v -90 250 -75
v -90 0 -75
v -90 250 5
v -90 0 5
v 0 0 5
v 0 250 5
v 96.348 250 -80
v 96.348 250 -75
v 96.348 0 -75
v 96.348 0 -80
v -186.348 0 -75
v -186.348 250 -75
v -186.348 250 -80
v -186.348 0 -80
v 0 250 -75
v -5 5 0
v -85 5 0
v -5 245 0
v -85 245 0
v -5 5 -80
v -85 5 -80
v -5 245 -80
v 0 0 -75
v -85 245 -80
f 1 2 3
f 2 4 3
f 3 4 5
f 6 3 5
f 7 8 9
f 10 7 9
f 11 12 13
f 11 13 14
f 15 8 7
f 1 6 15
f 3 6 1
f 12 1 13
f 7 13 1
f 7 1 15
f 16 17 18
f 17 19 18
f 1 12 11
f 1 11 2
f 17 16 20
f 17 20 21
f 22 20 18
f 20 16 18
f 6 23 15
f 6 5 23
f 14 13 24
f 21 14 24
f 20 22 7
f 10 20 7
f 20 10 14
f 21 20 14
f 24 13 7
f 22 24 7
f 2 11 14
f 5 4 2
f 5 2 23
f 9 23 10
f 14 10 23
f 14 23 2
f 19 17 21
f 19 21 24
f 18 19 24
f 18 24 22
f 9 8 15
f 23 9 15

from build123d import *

# Parameters (mm, degrees)
ESQUISSE1_W        = 90
ESQUISSE1_H        = 250
BOSS_EXTRU_1_DEPTH = 5
ESQUISSE2_W        = 90
ESQUISSE2_H        = 250
ESQUISSE2_W_2      = 80
ESQUISSE2_H_2      = 240
BOSS_EXTRU_2_DEPTH = 75
BOSS_EXTRU_3_DEPTH = 5


with BuildPart() as part:
    # Esquisse1 → Boss.-Extru.1 (new body)
    with BuildSketch(Plane.XY):
        with Locations((-45, 125)):
            Rectangle(ESQUISSE1_W, ESQUISSE1_H)
    extrude(amount=BOSS_EXTRU_1_DEPTH)

    # Esquisse2 → Boss.-Extru.2 (add)
    with BuildSketch(Plane(origin=(0, 0, 0), x_dir=(-1, 0, 0), z_dir=(0, 0, -1))):
        with Locations((45, 125)):
            Rectangle(ESQUISSE2_W, ESQUISSE2_H)
        with Locations((45, 125)):
            Rectangle(ESQUISSE2_W_2, ESQUISSE2_H_2, mode=Mode.SUBTRACT)
    extrude(amount=BOSS_EXTRU_2_DEPTH)

    # Esquisse3 → Boss.-Extru.3 (add)
    with BuildSketch(Plane(origin=(0, 0, -75), x_dir=(-1, 0, 0), z_dir=(0, 0, -1))):
        Polygon((6.025463364, 250), (-96.347652867, 250), (-96.347652867, 0), (-31.347652867, 0), (45, 0), (45, 5), (5, 5), (5, 245), (45, 245), (45, 250), align=None)
    boss_extru_3 = extrude(amount=BOSS_EXTRU_3_DEPTH)

    # Symétrie1: Boss.-Extru.3 across plane
    add(boss_extru_3.mirror(Plane(origin=(-45, 245, -80), x_dir=(0, 0, 1), z_dir=(1, 0, 0))))


solid = part.part
